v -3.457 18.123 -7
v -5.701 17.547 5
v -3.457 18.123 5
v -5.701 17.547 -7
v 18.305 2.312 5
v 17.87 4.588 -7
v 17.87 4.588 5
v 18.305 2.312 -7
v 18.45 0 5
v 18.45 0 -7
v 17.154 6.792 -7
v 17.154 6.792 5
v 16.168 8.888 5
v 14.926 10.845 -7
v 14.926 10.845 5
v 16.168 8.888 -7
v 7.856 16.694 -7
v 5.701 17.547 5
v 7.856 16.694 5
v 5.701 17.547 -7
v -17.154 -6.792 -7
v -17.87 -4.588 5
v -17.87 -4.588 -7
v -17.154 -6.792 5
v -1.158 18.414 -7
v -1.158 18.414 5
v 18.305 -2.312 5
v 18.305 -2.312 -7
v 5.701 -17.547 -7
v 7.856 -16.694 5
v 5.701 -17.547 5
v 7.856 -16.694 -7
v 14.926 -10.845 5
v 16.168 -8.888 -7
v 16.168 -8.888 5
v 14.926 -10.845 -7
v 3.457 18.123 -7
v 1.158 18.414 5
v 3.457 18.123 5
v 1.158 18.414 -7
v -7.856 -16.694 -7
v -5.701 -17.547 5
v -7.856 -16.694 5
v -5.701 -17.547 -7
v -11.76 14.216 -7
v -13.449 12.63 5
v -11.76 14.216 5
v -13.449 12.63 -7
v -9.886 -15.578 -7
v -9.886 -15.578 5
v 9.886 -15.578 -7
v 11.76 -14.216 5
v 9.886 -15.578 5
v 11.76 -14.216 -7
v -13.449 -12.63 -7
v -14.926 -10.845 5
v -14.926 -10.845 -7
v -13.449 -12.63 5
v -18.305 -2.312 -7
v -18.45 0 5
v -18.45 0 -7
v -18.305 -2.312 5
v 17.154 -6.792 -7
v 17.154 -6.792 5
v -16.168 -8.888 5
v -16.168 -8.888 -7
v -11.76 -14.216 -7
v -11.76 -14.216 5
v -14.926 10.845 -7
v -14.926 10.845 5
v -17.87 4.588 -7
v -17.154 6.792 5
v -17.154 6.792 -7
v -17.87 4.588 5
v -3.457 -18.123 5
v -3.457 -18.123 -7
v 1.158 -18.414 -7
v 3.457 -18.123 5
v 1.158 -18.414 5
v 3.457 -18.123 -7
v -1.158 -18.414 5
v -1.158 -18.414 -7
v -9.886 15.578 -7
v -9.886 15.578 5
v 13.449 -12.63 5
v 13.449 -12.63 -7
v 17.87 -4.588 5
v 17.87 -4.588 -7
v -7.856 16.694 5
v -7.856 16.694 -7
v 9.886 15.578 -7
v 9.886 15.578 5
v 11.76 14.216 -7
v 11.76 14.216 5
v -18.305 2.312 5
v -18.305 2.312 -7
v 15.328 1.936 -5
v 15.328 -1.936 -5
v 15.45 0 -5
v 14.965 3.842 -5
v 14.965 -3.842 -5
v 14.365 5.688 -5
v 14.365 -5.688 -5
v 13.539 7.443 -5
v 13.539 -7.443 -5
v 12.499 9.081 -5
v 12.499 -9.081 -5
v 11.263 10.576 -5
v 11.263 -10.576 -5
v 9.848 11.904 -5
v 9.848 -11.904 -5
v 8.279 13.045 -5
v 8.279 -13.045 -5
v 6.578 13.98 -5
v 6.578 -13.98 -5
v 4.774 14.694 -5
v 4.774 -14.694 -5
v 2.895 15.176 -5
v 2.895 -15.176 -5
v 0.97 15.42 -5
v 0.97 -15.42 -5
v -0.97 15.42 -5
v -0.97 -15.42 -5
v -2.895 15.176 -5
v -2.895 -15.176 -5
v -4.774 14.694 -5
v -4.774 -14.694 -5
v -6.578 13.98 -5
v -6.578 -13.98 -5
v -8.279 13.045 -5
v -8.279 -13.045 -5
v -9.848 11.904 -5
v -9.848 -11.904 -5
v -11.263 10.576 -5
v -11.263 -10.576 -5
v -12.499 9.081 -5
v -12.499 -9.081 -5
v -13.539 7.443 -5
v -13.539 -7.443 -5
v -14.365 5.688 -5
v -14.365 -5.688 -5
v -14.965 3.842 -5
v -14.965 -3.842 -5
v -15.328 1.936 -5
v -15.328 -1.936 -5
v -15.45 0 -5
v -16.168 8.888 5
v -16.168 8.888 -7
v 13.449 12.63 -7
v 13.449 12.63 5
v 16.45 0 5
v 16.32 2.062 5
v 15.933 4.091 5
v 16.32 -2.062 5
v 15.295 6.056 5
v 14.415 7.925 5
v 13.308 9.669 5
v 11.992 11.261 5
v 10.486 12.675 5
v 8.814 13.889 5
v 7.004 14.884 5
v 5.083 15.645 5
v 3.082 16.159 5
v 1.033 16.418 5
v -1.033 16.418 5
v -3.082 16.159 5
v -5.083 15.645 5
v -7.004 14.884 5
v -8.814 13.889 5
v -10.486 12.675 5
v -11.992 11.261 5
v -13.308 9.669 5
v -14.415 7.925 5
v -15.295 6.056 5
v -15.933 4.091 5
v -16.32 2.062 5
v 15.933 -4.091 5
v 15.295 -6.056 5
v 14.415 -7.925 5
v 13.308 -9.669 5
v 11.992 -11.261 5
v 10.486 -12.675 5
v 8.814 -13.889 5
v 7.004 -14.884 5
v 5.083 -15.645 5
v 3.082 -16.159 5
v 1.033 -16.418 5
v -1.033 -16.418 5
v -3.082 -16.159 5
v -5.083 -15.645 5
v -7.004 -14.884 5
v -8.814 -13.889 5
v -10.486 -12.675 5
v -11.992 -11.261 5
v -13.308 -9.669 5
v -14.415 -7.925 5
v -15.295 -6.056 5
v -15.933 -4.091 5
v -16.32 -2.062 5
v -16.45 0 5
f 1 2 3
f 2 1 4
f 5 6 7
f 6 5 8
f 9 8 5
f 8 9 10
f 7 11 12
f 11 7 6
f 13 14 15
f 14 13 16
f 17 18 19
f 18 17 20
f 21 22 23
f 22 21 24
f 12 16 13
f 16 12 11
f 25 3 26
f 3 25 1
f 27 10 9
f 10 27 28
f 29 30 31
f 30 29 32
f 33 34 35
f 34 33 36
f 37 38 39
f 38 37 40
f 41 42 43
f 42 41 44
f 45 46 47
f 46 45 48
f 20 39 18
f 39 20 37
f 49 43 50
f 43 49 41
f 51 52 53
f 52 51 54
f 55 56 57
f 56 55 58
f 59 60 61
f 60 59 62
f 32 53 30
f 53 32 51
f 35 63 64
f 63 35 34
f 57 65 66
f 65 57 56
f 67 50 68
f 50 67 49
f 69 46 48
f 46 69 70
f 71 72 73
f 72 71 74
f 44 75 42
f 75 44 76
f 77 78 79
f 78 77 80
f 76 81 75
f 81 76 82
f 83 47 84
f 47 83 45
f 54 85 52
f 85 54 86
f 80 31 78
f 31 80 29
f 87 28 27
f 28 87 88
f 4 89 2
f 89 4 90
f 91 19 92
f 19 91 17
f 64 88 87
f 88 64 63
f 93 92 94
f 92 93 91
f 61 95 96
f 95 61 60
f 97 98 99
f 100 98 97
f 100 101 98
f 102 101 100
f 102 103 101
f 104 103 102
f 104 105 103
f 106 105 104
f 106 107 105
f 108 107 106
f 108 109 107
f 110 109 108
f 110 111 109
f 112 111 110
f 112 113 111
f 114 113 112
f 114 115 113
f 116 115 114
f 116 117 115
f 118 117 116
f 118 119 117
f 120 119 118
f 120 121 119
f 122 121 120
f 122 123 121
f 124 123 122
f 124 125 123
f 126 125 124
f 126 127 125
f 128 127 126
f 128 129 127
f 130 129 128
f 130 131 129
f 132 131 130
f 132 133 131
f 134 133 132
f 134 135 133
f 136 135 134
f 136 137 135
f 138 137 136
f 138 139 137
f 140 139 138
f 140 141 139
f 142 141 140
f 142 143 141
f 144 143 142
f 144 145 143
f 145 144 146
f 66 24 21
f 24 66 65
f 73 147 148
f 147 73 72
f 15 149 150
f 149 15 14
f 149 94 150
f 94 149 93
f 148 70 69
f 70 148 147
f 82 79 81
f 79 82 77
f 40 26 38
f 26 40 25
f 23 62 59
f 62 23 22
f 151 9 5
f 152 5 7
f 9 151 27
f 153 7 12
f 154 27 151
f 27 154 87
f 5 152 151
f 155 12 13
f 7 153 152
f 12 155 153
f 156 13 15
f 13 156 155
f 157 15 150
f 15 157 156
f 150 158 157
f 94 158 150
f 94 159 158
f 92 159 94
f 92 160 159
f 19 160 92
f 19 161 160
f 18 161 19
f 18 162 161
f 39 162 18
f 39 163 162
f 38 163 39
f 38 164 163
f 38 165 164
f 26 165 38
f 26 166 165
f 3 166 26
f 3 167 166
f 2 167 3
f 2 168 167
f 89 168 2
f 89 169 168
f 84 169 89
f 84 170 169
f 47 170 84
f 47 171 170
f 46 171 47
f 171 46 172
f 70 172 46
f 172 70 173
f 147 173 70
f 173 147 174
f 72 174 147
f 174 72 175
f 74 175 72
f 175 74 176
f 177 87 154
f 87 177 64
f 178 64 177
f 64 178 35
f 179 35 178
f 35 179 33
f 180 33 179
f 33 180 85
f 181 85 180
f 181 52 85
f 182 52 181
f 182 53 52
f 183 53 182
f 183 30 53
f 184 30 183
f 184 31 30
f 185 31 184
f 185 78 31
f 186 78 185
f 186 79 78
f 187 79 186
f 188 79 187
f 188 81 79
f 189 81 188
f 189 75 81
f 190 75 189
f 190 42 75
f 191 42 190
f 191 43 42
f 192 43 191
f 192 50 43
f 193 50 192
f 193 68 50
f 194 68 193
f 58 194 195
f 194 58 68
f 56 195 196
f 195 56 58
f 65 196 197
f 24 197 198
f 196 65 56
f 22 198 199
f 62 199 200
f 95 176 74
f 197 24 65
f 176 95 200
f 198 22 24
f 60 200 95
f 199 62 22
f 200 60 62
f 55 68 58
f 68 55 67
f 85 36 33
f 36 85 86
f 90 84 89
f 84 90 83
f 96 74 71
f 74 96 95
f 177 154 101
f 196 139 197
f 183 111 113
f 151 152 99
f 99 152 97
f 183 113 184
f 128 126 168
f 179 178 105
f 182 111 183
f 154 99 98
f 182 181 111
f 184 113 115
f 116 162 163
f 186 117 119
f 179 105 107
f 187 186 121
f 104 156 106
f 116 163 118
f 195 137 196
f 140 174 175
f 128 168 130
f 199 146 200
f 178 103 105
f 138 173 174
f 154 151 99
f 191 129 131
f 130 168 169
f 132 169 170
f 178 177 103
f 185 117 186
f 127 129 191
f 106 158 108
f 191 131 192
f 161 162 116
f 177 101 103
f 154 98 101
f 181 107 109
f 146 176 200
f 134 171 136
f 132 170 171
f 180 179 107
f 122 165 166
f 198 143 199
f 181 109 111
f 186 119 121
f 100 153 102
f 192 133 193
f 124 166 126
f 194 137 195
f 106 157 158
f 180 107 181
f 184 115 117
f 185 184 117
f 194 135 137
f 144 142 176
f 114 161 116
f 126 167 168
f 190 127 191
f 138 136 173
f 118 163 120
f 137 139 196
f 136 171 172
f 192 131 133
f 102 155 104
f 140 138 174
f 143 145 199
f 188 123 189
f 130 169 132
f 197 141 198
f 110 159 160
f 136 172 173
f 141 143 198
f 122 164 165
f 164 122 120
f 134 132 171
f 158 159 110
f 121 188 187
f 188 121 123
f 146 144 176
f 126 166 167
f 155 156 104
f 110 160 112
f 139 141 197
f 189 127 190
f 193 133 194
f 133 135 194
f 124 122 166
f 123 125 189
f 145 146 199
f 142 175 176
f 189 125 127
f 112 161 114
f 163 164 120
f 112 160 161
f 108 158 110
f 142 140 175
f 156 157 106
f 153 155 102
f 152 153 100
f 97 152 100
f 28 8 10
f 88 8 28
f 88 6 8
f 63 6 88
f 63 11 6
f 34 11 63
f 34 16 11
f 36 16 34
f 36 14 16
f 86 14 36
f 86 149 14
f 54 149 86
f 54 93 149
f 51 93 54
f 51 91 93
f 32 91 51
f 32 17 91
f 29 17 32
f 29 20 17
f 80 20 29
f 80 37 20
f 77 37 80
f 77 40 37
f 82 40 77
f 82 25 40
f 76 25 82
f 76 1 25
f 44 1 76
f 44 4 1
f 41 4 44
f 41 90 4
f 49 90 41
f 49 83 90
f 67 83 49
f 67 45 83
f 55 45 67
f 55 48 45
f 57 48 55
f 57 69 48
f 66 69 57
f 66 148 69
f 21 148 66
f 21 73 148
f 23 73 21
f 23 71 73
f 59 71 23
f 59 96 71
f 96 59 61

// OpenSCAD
$fn = 50;

durchmesser_gross = 76.5;
durchmesser_klein = 32.4;
einfall = 1;
durchmesserextender = 0.5;

hoehe       = 10;
wandstaerke = 2;

durchmesser = durchmesser_klein + durchmesserextender;
radius = durchmesser / 2;

union() {
    difference() {     
        cylinder(h = hoehe, r2 = radius + wandstaerke, r1 = radius + wandstaerke, center = true);
        cylinder(h = hoehe, r2 = radius, r1 = radius - einfall, center = true);
    }
    translate([0, 0, -((hoehe + wandstaerke)/2)] )
        cylinder(h = wandstaerke, r = radius + wandstaerke, center = true);
}
